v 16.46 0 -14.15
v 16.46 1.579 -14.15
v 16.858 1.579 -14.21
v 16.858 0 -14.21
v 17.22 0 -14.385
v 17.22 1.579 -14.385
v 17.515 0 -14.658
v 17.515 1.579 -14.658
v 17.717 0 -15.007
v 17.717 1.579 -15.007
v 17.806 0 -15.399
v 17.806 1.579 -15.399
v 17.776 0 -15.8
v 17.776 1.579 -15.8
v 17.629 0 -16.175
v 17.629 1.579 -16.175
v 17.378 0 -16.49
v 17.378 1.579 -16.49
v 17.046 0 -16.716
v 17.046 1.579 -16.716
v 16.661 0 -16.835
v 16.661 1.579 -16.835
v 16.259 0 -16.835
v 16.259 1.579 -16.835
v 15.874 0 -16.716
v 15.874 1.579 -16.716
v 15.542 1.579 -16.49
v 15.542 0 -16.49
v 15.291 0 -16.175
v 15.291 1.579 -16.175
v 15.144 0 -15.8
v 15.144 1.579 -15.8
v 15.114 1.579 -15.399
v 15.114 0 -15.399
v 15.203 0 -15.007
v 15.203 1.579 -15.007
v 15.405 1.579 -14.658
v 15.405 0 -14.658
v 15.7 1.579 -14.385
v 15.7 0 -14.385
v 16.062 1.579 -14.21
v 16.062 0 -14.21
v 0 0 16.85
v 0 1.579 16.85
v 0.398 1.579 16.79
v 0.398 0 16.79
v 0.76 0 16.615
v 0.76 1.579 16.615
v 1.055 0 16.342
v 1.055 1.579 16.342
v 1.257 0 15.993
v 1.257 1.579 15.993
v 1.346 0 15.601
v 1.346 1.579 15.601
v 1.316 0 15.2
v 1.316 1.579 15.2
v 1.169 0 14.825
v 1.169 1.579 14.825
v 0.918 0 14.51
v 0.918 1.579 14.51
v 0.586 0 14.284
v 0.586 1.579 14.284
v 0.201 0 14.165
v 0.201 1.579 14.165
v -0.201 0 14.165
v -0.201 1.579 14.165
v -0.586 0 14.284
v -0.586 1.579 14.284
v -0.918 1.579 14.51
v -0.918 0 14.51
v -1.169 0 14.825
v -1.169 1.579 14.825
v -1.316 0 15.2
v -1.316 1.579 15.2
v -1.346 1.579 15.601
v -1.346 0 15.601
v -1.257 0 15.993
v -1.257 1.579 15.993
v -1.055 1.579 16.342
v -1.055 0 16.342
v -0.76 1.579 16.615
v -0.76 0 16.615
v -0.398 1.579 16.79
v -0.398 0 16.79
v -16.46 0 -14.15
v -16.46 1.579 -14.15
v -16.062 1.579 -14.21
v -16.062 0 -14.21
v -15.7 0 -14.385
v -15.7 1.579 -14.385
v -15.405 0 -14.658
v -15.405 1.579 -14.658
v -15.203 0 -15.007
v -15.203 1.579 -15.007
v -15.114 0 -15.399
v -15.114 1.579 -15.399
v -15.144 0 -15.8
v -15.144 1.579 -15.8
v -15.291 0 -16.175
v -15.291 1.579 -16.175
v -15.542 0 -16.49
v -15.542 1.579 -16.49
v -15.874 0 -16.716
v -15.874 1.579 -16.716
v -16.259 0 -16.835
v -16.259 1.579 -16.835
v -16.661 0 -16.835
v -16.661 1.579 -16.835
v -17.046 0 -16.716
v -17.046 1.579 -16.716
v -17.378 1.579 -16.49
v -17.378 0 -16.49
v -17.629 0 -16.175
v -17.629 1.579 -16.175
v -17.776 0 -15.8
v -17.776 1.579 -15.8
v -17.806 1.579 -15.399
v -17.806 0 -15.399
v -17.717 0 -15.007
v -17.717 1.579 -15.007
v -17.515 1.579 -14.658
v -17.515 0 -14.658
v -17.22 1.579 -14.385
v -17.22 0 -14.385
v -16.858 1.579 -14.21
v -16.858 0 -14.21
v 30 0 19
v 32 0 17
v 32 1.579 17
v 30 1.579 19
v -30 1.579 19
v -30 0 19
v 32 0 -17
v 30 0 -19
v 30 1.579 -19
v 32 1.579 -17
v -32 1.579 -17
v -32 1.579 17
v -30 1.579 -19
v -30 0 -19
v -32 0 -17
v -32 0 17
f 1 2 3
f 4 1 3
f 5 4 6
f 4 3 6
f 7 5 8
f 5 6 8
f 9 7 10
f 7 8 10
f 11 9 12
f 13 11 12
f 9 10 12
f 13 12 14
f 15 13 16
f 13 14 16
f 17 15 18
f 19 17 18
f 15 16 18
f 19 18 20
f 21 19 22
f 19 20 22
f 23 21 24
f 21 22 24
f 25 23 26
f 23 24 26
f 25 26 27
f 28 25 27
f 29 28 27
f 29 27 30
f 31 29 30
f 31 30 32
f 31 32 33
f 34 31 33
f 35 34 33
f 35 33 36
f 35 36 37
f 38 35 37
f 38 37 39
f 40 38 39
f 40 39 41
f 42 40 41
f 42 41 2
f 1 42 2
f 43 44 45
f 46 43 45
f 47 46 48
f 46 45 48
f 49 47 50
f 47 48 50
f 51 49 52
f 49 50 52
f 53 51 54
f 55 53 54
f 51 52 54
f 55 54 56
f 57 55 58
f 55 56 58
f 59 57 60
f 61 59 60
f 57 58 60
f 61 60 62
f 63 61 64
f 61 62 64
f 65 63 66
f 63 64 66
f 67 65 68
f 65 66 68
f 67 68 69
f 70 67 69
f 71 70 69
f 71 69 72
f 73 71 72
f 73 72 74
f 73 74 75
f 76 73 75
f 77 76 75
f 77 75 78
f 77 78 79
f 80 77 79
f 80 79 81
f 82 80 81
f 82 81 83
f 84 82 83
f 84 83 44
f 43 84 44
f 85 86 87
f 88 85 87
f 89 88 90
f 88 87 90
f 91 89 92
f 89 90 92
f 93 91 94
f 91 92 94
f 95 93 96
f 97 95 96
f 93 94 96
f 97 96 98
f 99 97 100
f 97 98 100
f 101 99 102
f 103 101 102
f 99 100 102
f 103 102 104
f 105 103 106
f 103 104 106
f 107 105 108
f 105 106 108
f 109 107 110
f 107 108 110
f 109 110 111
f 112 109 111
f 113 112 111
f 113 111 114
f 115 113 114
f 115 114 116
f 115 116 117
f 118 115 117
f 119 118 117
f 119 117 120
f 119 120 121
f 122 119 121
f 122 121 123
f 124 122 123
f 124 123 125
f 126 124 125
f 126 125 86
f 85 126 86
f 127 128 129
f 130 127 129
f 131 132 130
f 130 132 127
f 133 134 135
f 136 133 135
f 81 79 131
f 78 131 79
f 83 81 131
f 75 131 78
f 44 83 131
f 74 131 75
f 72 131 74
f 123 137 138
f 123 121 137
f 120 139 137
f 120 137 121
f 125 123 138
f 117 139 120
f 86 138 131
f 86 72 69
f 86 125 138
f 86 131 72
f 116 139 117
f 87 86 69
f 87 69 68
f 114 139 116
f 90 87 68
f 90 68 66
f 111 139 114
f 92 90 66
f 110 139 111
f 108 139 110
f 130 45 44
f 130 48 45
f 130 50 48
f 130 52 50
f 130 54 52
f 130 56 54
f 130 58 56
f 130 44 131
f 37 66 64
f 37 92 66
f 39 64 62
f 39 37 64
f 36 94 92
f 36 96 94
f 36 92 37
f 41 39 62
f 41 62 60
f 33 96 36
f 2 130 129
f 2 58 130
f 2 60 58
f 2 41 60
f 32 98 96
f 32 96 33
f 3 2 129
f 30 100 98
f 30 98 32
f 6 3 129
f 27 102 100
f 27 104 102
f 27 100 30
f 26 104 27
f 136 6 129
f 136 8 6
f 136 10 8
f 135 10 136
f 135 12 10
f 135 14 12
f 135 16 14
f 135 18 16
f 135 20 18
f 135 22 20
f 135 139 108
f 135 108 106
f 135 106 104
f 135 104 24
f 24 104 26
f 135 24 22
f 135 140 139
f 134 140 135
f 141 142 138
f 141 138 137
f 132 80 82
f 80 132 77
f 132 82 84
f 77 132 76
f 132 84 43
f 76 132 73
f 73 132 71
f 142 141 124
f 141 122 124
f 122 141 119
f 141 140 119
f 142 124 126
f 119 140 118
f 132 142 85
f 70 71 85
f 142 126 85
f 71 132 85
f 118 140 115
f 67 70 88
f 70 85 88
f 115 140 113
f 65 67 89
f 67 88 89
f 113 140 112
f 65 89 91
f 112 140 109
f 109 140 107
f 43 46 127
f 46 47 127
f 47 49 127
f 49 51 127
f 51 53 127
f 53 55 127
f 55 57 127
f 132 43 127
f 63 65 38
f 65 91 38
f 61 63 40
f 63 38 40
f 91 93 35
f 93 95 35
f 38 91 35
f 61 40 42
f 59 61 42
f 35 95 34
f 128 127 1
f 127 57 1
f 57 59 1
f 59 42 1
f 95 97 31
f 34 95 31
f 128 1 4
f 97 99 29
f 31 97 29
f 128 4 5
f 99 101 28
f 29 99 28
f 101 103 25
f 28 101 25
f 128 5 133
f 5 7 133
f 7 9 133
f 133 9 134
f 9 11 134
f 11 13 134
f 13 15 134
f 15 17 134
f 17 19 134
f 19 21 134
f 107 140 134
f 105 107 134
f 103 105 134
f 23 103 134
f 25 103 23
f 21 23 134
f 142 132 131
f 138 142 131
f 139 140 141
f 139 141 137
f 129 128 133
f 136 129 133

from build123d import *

# Parameters (mm, degrees)
SKETCH1_W           = 64
SKETCH1_H           = 38
BOSS_EXTRUDE1_DEPTH = 1.57875
CHAMFER1_SIZE       = 2
SKETCH3_R           = 1.35
CUT_EXTRUDE1_DEPTH  = 38.249059741


with BuildPart() as part:
    # Sketch1 → Boss-Extrude1 (new body)
    with BuildSketch(Plane(origin=(0, 0, 0), x_dir=(1, 0, 0), z_dir=(0, 1, 0))):
        Rectangle(SKETCH1_W, SKETCH1_H)
    extrude(amount=BOSS_EXTRUDE1_DEPTH)

    # Chamfer1
    chamfer1_edges = [part.edges().sort_by_distance(p)[0] for p in [
        (32, 0.789375, 19),
        (-32, 0.789375, 19),
        (-32, 0.789375, -19),
        (32, 0.789375, -19),
    ]]
    chamfer(chamfer1_edges, length=CHAMFER1_SIZE)

    # Sketch3 → Cut-Extrude1 (cut, through all)
    with BuildSketch(Plane(origin=(0, 1.57875, 0), x_dir=(1, 0, 0), z_dir=(0, 1, 0))):
        with Locations(Location((-16.46, 15.5, 0), (0, 0, 270))):
            Circle(SKETCH3_R)
        with Locations(Location((16.46, 15.5, 0), (0, 0, 270))):
            Circle(SKETCH3_R)
        with Locations(Location((0, -15.5, 0), (0, 0, 270))):
            Circle(SKETCH3_R)
    extrude(amount=-CUT_EXTRUDE1_DEPTH, mode=Mode.SUBTRACT)


solid = part.part
